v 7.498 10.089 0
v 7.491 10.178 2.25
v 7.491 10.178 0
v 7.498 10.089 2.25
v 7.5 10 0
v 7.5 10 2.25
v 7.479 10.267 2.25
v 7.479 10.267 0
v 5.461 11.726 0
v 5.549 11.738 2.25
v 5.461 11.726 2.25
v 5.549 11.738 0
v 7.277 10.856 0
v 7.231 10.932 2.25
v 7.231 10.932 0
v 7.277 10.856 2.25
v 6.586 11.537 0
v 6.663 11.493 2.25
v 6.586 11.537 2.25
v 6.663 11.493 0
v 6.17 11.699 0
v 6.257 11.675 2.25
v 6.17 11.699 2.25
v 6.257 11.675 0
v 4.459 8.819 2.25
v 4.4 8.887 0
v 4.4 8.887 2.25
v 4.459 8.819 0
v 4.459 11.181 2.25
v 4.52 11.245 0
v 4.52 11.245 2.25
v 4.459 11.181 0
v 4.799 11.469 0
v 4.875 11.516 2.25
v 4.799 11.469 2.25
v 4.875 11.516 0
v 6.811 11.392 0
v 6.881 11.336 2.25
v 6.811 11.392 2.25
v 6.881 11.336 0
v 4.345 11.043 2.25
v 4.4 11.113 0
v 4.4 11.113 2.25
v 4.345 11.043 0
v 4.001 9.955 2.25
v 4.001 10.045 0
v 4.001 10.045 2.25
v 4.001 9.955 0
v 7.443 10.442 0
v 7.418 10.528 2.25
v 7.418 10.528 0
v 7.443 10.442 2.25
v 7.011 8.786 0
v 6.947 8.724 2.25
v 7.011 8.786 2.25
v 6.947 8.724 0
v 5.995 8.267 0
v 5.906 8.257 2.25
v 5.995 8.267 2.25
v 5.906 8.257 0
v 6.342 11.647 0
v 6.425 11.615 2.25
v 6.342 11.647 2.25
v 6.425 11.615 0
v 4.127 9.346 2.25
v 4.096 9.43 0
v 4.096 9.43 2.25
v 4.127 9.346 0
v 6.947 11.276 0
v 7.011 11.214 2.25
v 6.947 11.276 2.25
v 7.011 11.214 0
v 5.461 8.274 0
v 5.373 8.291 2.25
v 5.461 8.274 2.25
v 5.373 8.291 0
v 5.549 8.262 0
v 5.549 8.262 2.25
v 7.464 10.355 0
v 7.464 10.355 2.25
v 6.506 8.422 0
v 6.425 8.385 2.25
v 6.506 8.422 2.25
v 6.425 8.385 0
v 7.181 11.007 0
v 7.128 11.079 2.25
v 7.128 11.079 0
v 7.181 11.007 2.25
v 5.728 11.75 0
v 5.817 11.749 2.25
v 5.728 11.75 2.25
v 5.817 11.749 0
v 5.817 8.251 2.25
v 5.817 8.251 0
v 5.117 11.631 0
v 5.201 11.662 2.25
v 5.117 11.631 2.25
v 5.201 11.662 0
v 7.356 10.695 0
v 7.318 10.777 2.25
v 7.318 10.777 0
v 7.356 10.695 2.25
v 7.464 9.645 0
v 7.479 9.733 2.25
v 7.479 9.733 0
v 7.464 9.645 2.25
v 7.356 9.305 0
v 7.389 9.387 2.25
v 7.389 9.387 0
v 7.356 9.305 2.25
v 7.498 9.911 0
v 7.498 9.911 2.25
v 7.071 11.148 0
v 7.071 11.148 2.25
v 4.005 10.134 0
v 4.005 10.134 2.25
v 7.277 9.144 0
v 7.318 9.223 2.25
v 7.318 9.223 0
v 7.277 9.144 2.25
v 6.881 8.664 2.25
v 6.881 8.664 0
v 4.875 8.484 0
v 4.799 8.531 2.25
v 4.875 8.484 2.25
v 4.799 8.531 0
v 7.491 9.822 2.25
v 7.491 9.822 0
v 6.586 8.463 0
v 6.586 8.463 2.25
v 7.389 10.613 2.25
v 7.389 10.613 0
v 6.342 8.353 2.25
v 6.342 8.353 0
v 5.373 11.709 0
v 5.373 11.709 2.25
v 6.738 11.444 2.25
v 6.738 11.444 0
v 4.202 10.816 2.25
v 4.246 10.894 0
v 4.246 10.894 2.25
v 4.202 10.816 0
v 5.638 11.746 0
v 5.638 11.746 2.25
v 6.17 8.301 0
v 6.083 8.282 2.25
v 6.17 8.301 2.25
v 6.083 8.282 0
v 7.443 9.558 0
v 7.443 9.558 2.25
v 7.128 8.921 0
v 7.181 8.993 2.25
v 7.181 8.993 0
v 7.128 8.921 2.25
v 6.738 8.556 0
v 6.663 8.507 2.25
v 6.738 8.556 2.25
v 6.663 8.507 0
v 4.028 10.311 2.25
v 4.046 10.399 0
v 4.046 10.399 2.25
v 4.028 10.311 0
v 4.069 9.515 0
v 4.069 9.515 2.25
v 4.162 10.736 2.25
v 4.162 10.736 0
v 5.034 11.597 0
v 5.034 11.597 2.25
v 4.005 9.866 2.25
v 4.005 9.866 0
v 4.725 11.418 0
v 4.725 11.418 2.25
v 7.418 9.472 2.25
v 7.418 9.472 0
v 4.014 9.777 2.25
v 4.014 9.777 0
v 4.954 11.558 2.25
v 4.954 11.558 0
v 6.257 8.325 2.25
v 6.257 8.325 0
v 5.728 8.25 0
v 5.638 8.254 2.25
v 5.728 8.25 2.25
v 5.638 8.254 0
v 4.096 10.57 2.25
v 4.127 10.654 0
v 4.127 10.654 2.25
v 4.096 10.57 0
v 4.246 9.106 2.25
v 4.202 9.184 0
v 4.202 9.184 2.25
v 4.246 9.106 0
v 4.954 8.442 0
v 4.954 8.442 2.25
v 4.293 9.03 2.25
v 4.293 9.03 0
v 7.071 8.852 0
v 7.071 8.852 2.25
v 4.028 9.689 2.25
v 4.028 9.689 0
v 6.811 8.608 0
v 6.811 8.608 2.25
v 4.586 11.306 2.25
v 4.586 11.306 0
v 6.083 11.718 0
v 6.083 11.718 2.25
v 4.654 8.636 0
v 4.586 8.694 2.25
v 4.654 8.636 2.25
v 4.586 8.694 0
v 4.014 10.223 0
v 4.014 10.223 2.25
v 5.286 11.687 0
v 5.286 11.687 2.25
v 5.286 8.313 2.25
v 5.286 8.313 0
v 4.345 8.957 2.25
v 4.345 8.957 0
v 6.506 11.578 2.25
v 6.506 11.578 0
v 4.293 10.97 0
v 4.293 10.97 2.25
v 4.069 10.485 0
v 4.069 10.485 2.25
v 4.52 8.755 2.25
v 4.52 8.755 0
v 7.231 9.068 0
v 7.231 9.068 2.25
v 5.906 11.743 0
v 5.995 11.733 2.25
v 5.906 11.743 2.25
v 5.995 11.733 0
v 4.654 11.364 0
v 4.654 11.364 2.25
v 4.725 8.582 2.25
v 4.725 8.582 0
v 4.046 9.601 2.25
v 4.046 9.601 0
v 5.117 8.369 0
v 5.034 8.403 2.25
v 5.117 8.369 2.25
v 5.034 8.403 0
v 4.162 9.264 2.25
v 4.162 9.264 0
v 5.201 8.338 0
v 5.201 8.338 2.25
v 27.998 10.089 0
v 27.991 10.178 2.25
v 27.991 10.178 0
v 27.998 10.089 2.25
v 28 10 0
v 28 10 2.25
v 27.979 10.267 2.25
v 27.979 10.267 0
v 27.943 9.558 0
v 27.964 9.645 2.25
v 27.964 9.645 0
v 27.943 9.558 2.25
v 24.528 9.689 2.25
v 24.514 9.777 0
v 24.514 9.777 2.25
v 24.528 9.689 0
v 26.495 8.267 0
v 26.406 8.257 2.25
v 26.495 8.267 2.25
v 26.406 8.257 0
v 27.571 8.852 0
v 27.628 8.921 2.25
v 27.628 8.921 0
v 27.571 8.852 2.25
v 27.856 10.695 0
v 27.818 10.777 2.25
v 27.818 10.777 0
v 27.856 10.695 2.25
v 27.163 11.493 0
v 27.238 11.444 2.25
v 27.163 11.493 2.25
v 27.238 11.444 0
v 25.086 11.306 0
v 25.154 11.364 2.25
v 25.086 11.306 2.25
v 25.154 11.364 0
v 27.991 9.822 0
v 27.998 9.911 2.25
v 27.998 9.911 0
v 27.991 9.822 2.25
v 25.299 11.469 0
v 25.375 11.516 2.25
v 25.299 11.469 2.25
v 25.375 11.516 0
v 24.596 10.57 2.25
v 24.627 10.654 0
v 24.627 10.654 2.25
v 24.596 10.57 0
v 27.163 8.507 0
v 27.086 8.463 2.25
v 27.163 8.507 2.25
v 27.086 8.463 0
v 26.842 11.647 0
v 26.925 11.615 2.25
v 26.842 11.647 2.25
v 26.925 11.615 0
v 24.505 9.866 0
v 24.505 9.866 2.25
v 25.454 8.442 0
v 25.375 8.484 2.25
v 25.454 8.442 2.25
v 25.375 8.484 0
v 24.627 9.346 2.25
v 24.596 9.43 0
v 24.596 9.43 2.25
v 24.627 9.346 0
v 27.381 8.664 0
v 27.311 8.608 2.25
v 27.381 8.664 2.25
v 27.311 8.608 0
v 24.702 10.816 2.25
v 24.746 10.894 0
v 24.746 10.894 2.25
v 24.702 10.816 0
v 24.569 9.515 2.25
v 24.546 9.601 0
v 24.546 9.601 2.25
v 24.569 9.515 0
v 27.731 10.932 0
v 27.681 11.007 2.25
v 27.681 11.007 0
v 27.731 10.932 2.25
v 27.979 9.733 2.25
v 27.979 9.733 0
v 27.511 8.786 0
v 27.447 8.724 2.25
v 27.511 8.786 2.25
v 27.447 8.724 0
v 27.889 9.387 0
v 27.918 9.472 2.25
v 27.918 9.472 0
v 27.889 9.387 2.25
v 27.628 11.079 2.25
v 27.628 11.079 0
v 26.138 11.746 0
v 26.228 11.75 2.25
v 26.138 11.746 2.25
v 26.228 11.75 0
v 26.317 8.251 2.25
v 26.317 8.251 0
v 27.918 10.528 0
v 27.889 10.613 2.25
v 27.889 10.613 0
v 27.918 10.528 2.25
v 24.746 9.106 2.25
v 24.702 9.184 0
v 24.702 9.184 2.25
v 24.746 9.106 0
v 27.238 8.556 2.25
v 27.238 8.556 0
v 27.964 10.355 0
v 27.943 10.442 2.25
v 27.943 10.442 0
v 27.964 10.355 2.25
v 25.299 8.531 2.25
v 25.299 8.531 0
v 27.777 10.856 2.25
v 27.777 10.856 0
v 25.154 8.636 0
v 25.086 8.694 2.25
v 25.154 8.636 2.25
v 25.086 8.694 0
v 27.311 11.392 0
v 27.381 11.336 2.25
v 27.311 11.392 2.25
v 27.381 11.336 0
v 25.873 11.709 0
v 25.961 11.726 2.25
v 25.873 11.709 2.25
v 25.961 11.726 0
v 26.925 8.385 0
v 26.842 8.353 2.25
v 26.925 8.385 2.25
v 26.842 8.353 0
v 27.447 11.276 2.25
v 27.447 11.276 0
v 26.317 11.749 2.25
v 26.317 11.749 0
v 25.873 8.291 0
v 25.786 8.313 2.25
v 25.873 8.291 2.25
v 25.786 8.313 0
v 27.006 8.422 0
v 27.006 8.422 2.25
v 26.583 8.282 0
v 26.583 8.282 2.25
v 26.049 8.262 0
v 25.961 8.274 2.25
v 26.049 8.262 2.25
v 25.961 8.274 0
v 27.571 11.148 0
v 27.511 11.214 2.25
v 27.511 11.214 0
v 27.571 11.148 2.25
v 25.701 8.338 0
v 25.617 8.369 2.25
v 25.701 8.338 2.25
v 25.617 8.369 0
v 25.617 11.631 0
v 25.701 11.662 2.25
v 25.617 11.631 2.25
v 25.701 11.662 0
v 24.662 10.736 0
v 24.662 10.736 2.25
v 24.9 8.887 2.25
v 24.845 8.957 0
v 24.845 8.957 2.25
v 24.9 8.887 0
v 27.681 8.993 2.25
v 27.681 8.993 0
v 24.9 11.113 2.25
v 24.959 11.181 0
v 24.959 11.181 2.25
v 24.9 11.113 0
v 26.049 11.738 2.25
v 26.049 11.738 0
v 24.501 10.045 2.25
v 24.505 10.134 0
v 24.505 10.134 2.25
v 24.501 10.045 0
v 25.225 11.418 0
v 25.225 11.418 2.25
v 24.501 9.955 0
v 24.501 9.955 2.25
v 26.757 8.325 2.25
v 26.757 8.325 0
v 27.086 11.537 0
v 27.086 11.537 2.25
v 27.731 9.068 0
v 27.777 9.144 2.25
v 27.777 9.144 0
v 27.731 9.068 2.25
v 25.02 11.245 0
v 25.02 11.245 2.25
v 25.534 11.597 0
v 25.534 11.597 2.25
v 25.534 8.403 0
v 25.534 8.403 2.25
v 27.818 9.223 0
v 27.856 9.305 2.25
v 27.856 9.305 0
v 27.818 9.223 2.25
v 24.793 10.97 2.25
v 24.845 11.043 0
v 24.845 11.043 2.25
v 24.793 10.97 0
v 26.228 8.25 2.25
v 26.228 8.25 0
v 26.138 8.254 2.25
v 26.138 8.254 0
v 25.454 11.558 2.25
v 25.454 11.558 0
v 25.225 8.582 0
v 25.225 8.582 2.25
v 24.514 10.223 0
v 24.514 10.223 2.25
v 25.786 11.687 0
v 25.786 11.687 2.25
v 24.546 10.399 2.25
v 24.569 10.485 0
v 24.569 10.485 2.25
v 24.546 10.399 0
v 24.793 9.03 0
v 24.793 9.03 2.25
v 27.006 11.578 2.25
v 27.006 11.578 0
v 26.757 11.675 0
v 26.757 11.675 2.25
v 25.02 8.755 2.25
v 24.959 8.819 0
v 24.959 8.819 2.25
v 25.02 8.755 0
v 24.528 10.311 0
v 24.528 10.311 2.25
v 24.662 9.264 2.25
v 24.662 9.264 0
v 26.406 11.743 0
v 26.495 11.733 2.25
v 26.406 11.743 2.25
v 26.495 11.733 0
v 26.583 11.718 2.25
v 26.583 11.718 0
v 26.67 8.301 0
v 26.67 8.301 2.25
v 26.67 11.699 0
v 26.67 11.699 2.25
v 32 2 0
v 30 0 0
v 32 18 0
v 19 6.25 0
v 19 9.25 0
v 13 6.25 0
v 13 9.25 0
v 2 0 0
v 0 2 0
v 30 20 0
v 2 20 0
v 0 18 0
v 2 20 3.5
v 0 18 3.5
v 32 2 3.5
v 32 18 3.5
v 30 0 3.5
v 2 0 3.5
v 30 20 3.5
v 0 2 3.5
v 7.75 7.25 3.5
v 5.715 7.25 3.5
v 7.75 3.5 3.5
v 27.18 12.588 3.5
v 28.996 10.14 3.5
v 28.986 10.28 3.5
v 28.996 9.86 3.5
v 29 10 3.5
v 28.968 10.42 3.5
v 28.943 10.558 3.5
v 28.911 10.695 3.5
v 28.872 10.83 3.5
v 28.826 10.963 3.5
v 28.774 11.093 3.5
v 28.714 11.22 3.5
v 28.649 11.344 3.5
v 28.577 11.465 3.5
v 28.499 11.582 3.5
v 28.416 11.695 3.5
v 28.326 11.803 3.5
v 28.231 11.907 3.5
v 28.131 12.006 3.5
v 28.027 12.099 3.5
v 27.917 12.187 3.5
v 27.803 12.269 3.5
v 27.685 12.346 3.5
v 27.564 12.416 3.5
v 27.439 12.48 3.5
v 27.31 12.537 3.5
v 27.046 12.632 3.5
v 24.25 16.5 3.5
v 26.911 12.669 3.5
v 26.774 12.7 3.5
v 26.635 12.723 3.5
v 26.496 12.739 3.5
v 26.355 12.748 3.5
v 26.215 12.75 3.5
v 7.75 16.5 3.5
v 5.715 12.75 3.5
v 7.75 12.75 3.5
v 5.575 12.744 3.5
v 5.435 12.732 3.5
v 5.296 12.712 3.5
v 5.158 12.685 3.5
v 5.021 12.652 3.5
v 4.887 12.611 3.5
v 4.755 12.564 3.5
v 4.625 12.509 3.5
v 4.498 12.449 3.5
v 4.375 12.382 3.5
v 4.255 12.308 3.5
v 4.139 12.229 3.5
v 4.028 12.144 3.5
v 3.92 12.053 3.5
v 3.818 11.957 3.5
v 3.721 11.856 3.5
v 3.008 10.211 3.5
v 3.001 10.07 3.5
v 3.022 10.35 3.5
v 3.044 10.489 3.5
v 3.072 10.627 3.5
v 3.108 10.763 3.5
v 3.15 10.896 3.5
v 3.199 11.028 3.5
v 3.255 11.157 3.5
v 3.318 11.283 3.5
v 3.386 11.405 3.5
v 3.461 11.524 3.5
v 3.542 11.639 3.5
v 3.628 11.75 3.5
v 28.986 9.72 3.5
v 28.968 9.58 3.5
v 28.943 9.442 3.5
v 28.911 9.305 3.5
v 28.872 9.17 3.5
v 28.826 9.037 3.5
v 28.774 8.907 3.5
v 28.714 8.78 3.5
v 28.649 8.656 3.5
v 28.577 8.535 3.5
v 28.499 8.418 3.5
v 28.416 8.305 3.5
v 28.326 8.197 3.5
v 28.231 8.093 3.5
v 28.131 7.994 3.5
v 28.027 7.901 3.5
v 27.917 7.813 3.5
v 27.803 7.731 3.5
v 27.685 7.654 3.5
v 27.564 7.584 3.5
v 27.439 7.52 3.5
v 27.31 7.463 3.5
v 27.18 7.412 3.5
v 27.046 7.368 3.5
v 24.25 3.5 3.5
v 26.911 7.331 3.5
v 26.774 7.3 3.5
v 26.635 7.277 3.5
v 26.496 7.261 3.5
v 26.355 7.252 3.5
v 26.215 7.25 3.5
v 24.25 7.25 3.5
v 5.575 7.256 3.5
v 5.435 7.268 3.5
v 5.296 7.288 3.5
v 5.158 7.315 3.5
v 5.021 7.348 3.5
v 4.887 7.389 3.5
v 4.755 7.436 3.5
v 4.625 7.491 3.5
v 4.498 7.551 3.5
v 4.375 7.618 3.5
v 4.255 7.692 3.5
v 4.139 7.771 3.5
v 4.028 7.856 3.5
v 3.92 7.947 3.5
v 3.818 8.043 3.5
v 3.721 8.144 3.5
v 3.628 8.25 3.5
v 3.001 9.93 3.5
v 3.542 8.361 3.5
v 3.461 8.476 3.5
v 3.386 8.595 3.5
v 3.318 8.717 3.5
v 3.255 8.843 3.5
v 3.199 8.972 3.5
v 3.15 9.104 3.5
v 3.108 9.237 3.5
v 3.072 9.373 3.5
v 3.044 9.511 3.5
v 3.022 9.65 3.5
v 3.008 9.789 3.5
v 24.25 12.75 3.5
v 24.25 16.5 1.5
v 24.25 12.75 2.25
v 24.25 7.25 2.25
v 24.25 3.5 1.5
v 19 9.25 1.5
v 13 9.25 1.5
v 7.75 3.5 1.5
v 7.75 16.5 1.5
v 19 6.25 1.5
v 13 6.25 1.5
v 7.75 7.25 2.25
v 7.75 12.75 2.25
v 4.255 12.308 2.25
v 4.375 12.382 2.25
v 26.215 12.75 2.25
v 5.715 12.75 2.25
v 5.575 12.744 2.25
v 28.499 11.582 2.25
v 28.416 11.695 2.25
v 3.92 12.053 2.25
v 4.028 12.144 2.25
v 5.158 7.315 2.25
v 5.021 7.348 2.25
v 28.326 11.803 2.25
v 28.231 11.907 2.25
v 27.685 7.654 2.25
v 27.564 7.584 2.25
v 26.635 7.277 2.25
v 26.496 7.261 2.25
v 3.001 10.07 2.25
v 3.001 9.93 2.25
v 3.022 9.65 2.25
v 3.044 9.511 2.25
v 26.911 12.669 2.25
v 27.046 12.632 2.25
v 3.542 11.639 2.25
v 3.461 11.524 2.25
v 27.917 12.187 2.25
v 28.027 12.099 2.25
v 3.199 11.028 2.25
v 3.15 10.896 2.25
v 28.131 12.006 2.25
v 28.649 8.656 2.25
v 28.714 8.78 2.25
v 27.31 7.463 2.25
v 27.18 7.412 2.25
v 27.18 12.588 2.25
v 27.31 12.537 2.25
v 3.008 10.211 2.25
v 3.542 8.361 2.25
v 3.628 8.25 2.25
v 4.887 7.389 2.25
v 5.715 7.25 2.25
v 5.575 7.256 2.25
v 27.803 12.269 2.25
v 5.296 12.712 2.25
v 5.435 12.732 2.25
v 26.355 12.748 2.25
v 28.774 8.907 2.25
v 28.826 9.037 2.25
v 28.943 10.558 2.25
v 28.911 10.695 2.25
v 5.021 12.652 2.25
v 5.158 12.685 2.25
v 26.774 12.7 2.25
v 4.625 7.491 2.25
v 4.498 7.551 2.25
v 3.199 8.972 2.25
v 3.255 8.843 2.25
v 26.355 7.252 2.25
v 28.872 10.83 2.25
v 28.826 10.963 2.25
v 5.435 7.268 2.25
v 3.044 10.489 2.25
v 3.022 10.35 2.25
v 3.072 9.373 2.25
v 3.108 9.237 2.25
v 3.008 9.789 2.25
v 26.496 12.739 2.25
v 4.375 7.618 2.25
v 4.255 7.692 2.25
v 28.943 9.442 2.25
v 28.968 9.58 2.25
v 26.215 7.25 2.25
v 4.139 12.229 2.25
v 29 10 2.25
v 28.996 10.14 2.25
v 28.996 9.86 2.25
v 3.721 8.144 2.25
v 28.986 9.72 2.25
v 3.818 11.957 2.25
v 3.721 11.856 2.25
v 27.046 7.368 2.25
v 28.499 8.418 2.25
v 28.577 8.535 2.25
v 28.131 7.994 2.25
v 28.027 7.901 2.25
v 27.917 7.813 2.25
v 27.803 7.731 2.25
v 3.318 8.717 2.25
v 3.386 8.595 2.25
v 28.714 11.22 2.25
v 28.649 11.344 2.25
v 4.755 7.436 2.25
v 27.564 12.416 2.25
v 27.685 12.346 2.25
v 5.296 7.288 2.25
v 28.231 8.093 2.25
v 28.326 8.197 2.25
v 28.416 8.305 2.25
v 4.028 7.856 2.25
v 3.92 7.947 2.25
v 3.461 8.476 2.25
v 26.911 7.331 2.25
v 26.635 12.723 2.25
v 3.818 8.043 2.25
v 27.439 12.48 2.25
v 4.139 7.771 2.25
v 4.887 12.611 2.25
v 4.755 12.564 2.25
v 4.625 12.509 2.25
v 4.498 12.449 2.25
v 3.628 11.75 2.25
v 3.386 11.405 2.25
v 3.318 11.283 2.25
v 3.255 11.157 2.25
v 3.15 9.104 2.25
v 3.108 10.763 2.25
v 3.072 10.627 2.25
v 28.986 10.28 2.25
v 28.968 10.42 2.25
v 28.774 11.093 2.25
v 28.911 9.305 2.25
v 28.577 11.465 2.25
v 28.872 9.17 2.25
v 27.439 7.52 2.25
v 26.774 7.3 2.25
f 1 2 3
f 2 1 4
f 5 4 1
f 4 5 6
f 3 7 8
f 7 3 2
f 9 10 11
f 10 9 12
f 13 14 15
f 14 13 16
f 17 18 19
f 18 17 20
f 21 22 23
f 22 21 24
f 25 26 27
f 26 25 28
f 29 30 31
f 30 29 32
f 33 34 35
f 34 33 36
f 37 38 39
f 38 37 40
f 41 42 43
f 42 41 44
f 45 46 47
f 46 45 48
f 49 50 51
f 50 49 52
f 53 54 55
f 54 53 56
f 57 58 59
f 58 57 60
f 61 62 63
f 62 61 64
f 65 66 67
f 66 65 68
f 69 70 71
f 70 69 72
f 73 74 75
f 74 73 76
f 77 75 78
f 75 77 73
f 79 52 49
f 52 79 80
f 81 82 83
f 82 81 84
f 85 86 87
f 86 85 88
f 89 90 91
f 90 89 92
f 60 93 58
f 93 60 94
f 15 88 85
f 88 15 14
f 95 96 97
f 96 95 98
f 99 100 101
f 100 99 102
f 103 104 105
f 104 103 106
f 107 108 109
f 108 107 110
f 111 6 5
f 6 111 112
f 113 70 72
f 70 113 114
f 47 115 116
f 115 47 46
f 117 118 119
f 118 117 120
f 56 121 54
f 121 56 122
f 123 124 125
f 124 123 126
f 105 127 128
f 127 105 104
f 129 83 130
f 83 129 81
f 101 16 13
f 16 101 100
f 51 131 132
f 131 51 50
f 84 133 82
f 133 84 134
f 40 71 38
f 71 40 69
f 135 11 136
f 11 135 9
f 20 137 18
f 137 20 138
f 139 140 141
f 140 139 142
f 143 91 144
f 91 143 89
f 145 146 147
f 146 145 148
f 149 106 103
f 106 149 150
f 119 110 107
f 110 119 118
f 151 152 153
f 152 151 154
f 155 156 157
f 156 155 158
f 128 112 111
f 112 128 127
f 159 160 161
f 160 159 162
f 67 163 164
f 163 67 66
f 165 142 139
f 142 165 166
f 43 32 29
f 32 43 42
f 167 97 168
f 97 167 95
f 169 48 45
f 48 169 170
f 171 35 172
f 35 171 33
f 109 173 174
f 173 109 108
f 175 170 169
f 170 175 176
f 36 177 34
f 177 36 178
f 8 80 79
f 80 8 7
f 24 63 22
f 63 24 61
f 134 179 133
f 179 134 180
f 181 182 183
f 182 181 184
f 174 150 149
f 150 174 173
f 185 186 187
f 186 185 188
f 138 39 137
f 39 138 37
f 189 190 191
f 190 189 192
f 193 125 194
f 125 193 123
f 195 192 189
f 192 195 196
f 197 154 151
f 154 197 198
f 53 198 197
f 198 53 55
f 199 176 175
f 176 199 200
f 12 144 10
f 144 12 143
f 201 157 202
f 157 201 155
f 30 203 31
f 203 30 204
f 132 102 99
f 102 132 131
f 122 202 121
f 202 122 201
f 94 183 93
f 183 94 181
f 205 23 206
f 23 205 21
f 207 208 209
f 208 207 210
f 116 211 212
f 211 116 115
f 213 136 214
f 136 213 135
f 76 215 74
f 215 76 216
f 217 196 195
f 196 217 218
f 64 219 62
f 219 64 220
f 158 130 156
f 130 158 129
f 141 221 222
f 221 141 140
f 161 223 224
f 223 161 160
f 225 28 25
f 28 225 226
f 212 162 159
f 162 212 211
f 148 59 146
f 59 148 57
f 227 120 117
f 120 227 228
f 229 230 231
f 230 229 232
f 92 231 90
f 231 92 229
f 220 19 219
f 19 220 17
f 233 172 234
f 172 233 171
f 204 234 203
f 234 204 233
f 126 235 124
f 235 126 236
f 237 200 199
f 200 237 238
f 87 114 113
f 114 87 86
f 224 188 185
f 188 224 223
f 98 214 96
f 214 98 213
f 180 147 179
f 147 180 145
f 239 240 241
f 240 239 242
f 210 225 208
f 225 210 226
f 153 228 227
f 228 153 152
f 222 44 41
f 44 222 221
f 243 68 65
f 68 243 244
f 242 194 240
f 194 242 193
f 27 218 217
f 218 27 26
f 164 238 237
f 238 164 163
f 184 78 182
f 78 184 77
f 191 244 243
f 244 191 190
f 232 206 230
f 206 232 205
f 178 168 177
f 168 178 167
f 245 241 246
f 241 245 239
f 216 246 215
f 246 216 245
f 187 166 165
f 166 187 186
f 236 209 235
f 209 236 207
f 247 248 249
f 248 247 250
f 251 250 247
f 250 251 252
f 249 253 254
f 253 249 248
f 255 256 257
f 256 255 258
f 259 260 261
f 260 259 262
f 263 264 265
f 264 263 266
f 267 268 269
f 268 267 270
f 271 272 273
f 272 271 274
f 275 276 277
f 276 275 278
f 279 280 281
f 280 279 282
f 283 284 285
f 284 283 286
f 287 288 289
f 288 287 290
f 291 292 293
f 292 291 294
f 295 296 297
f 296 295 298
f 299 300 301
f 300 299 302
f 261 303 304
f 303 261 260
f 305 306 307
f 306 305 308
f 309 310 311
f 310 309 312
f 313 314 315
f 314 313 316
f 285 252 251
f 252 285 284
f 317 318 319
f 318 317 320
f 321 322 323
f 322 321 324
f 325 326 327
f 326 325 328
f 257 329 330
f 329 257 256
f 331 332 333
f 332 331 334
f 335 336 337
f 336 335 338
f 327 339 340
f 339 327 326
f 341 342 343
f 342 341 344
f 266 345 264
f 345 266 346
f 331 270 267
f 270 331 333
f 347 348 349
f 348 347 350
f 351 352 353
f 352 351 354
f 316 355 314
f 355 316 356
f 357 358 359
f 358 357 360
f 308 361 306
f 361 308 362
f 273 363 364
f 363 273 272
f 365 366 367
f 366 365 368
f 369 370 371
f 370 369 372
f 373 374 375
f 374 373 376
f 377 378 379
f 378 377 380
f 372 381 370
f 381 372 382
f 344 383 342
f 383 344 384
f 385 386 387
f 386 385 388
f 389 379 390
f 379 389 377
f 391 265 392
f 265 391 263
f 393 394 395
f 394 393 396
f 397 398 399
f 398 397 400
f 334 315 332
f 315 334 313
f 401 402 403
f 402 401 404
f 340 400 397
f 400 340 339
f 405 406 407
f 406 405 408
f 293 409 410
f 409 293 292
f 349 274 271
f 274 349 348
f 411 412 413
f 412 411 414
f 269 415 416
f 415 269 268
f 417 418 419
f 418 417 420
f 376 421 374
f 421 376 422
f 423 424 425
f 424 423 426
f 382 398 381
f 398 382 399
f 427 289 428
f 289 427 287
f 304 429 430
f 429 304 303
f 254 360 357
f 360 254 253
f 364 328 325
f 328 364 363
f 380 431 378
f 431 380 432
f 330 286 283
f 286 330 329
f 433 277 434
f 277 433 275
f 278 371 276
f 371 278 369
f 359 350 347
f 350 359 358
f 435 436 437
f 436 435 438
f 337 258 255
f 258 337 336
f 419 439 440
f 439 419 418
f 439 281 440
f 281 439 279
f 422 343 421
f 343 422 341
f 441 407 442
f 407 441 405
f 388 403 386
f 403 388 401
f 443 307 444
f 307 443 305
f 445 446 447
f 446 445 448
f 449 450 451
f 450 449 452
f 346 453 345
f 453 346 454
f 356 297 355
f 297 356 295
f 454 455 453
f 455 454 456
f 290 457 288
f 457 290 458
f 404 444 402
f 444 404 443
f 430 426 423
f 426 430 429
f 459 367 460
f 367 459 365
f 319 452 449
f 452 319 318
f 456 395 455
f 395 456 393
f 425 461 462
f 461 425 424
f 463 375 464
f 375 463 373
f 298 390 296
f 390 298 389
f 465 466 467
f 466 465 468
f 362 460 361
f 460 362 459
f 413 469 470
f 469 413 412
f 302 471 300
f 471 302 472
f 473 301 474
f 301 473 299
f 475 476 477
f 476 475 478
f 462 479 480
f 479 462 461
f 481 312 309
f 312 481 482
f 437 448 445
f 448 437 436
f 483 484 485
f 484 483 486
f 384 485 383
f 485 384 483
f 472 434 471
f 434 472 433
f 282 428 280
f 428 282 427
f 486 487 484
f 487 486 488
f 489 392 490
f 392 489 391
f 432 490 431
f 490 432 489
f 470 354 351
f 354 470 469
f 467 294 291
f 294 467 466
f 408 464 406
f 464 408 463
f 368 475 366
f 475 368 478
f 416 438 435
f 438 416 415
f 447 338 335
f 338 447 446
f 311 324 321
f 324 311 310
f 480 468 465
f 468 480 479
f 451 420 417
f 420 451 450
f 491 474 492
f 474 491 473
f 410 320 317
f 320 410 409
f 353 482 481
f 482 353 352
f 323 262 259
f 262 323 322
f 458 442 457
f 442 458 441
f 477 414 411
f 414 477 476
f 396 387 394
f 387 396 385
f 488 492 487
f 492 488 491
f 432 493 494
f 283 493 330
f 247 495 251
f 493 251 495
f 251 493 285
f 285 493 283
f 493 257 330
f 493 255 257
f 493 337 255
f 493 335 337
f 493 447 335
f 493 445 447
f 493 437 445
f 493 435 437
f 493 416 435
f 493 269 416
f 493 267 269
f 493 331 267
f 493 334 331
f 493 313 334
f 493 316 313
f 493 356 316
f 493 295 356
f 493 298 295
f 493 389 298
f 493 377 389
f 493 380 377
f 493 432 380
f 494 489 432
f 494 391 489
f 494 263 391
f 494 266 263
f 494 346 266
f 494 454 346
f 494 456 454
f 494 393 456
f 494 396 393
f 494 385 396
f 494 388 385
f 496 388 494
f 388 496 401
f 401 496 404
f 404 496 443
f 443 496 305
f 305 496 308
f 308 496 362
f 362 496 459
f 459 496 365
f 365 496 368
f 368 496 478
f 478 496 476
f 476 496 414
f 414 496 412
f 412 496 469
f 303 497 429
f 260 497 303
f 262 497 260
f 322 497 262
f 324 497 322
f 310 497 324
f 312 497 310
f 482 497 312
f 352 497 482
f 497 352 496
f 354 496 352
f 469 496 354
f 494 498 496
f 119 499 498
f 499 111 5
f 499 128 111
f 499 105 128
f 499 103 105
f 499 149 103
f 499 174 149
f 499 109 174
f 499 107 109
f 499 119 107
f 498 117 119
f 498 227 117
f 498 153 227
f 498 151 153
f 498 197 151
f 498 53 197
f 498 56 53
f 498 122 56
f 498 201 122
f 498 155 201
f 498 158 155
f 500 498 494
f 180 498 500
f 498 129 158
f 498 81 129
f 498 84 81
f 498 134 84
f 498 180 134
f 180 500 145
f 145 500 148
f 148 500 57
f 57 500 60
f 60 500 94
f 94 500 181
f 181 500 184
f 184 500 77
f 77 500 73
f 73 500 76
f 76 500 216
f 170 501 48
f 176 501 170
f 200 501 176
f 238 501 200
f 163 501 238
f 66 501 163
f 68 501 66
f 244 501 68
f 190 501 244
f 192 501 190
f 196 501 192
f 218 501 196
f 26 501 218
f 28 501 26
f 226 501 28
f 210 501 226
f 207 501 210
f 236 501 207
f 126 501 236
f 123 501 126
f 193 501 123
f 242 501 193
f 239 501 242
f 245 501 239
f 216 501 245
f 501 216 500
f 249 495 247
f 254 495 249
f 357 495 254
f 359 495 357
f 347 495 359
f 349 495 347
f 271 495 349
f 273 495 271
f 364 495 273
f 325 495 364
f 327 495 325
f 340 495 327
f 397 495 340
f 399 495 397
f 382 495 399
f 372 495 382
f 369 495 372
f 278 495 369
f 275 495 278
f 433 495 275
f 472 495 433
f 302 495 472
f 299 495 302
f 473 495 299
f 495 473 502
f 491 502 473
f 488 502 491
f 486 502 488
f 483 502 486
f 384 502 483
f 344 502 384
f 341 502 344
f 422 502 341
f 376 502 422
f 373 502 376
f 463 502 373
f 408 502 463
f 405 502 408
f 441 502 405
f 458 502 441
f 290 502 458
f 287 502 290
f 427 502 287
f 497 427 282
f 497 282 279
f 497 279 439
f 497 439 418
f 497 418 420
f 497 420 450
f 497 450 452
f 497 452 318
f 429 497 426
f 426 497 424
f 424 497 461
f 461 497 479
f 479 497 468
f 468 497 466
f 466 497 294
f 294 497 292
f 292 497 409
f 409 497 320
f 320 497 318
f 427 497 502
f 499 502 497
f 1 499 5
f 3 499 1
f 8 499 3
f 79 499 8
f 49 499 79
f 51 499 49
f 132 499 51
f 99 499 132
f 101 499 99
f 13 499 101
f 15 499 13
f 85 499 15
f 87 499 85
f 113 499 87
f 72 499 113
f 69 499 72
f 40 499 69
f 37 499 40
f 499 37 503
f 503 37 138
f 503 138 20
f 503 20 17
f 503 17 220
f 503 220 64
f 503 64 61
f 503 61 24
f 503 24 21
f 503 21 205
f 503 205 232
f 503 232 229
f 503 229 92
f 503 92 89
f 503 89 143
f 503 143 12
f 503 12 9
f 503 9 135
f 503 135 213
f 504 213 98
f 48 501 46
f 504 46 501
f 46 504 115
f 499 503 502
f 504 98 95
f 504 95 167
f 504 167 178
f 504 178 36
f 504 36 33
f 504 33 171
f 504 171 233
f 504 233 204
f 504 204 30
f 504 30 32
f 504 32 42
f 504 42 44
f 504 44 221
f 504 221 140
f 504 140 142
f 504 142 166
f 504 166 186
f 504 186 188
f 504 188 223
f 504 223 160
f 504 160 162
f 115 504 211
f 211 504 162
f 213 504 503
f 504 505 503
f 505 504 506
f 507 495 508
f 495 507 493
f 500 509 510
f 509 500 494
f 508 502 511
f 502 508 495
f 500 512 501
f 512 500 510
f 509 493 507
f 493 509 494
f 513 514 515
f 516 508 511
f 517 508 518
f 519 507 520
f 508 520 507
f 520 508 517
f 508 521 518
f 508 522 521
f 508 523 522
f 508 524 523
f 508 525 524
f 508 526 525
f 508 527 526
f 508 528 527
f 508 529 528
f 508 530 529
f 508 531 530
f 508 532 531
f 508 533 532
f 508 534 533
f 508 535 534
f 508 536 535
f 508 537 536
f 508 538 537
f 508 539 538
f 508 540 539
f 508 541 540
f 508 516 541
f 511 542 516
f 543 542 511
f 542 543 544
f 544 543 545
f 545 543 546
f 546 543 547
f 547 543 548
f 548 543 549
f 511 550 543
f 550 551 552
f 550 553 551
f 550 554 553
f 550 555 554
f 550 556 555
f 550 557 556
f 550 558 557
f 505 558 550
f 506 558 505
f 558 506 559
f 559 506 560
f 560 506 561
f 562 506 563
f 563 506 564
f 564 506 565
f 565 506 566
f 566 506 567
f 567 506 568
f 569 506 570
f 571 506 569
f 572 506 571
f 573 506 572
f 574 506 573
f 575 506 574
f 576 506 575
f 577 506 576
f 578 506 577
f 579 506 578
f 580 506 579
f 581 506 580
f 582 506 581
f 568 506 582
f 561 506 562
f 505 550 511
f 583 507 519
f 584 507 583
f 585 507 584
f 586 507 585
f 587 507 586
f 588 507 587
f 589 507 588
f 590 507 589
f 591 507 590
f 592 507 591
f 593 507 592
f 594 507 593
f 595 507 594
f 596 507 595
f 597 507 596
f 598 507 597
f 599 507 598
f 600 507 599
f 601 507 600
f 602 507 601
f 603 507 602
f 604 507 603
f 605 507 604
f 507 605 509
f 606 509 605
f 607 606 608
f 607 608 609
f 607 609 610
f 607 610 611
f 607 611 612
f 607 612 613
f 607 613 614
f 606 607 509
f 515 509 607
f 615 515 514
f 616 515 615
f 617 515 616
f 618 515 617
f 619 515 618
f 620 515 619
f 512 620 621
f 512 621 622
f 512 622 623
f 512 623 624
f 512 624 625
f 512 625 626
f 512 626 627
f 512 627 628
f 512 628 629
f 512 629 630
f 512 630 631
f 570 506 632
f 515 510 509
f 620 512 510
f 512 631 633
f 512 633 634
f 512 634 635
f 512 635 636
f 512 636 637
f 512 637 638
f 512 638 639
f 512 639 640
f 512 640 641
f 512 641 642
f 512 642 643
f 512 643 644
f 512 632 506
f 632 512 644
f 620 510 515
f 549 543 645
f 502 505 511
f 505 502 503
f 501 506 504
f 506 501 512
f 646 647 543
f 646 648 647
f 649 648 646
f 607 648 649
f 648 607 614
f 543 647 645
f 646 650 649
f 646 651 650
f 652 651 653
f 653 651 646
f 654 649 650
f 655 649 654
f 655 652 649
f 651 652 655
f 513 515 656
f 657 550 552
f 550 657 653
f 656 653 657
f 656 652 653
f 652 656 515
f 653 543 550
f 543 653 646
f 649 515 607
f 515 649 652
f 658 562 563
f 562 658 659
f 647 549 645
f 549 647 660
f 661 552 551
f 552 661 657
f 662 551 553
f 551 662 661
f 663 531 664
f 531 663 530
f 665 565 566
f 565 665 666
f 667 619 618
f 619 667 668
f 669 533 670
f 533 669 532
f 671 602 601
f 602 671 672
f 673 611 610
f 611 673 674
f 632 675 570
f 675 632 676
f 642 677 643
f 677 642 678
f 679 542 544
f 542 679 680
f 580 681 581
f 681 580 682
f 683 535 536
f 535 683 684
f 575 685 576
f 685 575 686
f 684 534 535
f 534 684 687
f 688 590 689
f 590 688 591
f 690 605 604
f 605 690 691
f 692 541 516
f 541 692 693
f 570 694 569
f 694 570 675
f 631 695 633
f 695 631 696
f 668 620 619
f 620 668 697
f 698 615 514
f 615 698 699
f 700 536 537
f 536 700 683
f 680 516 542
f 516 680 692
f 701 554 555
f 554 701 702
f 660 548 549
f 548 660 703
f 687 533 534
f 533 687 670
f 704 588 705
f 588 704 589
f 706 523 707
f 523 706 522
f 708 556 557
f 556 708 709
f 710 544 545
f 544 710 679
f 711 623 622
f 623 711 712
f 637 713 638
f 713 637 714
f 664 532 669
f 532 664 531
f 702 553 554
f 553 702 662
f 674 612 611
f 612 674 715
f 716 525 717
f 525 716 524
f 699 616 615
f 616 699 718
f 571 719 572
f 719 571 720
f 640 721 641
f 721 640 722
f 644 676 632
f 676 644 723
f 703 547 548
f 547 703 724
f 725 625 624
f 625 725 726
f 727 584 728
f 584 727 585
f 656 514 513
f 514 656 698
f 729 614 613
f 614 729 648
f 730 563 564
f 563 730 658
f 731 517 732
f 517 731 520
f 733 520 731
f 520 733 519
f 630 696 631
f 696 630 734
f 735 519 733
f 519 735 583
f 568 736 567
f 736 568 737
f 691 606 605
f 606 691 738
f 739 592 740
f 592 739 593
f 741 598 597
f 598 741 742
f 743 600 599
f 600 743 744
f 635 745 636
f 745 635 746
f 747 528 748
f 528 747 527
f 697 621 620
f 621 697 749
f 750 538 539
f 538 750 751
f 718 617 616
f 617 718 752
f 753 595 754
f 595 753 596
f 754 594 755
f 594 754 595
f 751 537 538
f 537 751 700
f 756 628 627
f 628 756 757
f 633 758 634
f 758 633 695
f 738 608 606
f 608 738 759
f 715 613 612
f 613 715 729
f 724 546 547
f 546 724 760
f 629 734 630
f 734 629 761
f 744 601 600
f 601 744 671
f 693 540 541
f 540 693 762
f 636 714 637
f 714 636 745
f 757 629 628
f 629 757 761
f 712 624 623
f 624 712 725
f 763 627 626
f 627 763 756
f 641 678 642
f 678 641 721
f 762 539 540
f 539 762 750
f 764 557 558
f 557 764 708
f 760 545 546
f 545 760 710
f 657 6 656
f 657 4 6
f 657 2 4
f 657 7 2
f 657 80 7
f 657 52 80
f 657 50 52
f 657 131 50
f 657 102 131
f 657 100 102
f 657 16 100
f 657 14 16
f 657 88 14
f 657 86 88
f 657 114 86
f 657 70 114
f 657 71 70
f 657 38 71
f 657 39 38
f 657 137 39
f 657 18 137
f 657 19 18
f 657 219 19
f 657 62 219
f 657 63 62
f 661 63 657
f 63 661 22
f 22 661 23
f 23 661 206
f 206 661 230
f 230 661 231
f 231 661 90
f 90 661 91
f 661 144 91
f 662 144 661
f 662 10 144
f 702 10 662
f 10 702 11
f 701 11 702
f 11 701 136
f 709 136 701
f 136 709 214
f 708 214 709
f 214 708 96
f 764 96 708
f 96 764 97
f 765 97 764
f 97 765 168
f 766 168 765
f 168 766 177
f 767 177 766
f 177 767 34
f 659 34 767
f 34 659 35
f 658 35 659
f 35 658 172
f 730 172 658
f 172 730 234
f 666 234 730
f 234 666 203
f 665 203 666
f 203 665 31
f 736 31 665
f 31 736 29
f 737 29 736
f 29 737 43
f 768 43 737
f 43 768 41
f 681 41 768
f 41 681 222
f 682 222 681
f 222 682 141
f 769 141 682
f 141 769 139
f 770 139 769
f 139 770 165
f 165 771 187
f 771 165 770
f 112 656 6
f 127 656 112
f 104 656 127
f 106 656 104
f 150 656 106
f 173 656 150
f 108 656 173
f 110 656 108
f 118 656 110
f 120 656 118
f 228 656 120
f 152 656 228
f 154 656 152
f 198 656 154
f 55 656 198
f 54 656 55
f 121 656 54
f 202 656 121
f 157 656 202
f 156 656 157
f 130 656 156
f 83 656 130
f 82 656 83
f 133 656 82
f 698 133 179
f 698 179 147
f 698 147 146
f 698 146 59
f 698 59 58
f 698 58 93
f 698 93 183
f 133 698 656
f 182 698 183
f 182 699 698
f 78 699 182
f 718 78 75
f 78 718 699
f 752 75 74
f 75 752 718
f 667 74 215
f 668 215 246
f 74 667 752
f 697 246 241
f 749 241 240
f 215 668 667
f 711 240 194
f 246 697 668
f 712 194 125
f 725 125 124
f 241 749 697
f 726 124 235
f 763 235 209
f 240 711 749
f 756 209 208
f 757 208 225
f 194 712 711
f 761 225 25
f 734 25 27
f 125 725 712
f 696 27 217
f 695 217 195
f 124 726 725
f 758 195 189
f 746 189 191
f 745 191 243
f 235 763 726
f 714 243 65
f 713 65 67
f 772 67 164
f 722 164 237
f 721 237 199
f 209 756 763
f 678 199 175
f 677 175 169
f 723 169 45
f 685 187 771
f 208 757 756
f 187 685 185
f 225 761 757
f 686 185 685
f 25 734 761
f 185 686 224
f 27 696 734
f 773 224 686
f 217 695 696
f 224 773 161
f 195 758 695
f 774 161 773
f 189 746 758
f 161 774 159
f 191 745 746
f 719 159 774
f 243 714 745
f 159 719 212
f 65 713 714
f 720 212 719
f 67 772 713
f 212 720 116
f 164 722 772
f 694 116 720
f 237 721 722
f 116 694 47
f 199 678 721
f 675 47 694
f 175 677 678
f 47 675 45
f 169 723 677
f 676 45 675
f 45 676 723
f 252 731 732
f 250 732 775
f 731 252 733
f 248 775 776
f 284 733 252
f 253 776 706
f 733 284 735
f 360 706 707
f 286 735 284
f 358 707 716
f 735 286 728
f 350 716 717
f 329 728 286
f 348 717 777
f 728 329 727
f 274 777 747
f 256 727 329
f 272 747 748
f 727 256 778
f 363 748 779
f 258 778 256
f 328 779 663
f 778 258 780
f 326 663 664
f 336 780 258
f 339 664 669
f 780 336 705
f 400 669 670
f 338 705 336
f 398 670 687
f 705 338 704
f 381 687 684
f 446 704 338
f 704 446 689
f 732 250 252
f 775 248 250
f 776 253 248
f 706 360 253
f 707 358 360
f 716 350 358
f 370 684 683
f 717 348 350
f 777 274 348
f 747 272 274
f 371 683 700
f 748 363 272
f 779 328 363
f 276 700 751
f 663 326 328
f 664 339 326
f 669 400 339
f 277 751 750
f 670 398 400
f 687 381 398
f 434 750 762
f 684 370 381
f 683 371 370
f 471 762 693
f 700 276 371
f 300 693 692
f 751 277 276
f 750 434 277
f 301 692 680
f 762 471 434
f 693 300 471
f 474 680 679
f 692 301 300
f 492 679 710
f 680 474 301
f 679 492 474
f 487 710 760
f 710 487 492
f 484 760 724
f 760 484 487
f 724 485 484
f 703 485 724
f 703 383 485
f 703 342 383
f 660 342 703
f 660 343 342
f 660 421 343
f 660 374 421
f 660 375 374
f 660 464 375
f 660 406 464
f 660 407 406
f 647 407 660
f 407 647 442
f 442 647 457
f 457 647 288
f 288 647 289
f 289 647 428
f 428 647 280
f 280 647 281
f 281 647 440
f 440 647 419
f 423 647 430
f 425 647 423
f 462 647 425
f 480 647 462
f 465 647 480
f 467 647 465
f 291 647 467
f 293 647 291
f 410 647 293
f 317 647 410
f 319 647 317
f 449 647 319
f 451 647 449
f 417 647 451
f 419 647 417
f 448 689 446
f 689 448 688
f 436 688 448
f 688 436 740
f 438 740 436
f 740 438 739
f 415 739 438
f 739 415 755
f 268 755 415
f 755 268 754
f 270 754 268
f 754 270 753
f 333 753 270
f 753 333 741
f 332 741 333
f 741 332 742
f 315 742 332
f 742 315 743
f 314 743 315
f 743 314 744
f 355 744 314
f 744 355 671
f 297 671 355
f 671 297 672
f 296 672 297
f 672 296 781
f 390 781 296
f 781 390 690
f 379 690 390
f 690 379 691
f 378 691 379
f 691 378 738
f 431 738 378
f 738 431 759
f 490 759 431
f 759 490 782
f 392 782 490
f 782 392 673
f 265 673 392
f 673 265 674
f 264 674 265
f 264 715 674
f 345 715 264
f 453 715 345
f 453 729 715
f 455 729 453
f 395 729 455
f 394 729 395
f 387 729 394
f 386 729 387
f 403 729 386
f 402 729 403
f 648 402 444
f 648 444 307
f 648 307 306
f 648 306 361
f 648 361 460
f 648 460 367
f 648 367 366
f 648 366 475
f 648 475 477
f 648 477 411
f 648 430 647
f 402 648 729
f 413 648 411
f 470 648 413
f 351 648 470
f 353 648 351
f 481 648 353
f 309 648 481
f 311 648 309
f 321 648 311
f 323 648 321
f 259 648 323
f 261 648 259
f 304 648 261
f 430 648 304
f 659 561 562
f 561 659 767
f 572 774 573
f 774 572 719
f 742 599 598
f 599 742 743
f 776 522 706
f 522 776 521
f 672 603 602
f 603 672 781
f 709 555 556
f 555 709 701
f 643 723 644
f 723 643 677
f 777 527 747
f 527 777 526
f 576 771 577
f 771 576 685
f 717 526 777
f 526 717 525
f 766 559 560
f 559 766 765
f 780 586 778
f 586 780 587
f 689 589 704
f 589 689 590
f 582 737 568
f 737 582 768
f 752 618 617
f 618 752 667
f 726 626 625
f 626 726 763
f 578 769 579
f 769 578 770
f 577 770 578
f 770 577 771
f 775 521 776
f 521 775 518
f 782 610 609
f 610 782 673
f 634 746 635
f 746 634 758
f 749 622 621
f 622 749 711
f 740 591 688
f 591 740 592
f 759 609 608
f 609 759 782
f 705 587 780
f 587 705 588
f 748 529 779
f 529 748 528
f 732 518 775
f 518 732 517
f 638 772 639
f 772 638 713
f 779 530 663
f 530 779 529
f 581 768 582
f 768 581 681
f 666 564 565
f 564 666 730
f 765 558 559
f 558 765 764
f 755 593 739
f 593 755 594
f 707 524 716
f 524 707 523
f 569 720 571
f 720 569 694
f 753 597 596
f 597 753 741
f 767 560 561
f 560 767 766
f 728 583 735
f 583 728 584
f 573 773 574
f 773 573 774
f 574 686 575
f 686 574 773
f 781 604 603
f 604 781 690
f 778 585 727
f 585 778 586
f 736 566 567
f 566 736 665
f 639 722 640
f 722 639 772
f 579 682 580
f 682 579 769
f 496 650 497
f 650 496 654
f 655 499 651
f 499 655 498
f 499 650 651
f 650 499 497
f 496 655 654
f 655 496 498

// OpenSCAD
/* $Id: vl53l0x-bracket.scad,v 1.2 2022/02/03 19:36:18 tobi Exp $ */

$fn=123;

// PCB test bracket for the CJ VL53L0X V2 module from AZ-Delivery
// FIXME: needs a cut-out for pin headers and/or cabling

difference() {
  hull() { // base plate
    translate([2,0,0]) cube([32-2*2, 20, 3.5]);
    translate([0,2,0]) cube([32, 20-2*2, 3.5]);
  }

  translate([32/2-16.5/2, 20/2-13/2, 1.5])
    cube([16.5,13, 3]); // pcb

  translate([32/2-16.5/2, 20/2-13/2, 2.25]) hull() { // ears
    translate([-5/2+.5, 13/2, 0]) cylinder(r=5.5/2, h=3);
    translate([16.5+5/2-.5, 13/2, 0]) cylinder(r=5.5/2, h=3);
  }

  // m3+ screw holes  
  translate([32/2-16.5/2, 20/2-13/2, -.01]) {
    translate([-5/2+.5, 13/2, 0]) cylinder(r=3.5/2, h=3.02);
    translate([16.5+5/2-.5, 13/2, 0]) cylinder(r=3.5/2, h=3.02);
  }

  // sensor window
  translate([32/2-6/2, 20/2-13/2+2.75, -.01])
    cube([6, 3, 3.02]);

}
